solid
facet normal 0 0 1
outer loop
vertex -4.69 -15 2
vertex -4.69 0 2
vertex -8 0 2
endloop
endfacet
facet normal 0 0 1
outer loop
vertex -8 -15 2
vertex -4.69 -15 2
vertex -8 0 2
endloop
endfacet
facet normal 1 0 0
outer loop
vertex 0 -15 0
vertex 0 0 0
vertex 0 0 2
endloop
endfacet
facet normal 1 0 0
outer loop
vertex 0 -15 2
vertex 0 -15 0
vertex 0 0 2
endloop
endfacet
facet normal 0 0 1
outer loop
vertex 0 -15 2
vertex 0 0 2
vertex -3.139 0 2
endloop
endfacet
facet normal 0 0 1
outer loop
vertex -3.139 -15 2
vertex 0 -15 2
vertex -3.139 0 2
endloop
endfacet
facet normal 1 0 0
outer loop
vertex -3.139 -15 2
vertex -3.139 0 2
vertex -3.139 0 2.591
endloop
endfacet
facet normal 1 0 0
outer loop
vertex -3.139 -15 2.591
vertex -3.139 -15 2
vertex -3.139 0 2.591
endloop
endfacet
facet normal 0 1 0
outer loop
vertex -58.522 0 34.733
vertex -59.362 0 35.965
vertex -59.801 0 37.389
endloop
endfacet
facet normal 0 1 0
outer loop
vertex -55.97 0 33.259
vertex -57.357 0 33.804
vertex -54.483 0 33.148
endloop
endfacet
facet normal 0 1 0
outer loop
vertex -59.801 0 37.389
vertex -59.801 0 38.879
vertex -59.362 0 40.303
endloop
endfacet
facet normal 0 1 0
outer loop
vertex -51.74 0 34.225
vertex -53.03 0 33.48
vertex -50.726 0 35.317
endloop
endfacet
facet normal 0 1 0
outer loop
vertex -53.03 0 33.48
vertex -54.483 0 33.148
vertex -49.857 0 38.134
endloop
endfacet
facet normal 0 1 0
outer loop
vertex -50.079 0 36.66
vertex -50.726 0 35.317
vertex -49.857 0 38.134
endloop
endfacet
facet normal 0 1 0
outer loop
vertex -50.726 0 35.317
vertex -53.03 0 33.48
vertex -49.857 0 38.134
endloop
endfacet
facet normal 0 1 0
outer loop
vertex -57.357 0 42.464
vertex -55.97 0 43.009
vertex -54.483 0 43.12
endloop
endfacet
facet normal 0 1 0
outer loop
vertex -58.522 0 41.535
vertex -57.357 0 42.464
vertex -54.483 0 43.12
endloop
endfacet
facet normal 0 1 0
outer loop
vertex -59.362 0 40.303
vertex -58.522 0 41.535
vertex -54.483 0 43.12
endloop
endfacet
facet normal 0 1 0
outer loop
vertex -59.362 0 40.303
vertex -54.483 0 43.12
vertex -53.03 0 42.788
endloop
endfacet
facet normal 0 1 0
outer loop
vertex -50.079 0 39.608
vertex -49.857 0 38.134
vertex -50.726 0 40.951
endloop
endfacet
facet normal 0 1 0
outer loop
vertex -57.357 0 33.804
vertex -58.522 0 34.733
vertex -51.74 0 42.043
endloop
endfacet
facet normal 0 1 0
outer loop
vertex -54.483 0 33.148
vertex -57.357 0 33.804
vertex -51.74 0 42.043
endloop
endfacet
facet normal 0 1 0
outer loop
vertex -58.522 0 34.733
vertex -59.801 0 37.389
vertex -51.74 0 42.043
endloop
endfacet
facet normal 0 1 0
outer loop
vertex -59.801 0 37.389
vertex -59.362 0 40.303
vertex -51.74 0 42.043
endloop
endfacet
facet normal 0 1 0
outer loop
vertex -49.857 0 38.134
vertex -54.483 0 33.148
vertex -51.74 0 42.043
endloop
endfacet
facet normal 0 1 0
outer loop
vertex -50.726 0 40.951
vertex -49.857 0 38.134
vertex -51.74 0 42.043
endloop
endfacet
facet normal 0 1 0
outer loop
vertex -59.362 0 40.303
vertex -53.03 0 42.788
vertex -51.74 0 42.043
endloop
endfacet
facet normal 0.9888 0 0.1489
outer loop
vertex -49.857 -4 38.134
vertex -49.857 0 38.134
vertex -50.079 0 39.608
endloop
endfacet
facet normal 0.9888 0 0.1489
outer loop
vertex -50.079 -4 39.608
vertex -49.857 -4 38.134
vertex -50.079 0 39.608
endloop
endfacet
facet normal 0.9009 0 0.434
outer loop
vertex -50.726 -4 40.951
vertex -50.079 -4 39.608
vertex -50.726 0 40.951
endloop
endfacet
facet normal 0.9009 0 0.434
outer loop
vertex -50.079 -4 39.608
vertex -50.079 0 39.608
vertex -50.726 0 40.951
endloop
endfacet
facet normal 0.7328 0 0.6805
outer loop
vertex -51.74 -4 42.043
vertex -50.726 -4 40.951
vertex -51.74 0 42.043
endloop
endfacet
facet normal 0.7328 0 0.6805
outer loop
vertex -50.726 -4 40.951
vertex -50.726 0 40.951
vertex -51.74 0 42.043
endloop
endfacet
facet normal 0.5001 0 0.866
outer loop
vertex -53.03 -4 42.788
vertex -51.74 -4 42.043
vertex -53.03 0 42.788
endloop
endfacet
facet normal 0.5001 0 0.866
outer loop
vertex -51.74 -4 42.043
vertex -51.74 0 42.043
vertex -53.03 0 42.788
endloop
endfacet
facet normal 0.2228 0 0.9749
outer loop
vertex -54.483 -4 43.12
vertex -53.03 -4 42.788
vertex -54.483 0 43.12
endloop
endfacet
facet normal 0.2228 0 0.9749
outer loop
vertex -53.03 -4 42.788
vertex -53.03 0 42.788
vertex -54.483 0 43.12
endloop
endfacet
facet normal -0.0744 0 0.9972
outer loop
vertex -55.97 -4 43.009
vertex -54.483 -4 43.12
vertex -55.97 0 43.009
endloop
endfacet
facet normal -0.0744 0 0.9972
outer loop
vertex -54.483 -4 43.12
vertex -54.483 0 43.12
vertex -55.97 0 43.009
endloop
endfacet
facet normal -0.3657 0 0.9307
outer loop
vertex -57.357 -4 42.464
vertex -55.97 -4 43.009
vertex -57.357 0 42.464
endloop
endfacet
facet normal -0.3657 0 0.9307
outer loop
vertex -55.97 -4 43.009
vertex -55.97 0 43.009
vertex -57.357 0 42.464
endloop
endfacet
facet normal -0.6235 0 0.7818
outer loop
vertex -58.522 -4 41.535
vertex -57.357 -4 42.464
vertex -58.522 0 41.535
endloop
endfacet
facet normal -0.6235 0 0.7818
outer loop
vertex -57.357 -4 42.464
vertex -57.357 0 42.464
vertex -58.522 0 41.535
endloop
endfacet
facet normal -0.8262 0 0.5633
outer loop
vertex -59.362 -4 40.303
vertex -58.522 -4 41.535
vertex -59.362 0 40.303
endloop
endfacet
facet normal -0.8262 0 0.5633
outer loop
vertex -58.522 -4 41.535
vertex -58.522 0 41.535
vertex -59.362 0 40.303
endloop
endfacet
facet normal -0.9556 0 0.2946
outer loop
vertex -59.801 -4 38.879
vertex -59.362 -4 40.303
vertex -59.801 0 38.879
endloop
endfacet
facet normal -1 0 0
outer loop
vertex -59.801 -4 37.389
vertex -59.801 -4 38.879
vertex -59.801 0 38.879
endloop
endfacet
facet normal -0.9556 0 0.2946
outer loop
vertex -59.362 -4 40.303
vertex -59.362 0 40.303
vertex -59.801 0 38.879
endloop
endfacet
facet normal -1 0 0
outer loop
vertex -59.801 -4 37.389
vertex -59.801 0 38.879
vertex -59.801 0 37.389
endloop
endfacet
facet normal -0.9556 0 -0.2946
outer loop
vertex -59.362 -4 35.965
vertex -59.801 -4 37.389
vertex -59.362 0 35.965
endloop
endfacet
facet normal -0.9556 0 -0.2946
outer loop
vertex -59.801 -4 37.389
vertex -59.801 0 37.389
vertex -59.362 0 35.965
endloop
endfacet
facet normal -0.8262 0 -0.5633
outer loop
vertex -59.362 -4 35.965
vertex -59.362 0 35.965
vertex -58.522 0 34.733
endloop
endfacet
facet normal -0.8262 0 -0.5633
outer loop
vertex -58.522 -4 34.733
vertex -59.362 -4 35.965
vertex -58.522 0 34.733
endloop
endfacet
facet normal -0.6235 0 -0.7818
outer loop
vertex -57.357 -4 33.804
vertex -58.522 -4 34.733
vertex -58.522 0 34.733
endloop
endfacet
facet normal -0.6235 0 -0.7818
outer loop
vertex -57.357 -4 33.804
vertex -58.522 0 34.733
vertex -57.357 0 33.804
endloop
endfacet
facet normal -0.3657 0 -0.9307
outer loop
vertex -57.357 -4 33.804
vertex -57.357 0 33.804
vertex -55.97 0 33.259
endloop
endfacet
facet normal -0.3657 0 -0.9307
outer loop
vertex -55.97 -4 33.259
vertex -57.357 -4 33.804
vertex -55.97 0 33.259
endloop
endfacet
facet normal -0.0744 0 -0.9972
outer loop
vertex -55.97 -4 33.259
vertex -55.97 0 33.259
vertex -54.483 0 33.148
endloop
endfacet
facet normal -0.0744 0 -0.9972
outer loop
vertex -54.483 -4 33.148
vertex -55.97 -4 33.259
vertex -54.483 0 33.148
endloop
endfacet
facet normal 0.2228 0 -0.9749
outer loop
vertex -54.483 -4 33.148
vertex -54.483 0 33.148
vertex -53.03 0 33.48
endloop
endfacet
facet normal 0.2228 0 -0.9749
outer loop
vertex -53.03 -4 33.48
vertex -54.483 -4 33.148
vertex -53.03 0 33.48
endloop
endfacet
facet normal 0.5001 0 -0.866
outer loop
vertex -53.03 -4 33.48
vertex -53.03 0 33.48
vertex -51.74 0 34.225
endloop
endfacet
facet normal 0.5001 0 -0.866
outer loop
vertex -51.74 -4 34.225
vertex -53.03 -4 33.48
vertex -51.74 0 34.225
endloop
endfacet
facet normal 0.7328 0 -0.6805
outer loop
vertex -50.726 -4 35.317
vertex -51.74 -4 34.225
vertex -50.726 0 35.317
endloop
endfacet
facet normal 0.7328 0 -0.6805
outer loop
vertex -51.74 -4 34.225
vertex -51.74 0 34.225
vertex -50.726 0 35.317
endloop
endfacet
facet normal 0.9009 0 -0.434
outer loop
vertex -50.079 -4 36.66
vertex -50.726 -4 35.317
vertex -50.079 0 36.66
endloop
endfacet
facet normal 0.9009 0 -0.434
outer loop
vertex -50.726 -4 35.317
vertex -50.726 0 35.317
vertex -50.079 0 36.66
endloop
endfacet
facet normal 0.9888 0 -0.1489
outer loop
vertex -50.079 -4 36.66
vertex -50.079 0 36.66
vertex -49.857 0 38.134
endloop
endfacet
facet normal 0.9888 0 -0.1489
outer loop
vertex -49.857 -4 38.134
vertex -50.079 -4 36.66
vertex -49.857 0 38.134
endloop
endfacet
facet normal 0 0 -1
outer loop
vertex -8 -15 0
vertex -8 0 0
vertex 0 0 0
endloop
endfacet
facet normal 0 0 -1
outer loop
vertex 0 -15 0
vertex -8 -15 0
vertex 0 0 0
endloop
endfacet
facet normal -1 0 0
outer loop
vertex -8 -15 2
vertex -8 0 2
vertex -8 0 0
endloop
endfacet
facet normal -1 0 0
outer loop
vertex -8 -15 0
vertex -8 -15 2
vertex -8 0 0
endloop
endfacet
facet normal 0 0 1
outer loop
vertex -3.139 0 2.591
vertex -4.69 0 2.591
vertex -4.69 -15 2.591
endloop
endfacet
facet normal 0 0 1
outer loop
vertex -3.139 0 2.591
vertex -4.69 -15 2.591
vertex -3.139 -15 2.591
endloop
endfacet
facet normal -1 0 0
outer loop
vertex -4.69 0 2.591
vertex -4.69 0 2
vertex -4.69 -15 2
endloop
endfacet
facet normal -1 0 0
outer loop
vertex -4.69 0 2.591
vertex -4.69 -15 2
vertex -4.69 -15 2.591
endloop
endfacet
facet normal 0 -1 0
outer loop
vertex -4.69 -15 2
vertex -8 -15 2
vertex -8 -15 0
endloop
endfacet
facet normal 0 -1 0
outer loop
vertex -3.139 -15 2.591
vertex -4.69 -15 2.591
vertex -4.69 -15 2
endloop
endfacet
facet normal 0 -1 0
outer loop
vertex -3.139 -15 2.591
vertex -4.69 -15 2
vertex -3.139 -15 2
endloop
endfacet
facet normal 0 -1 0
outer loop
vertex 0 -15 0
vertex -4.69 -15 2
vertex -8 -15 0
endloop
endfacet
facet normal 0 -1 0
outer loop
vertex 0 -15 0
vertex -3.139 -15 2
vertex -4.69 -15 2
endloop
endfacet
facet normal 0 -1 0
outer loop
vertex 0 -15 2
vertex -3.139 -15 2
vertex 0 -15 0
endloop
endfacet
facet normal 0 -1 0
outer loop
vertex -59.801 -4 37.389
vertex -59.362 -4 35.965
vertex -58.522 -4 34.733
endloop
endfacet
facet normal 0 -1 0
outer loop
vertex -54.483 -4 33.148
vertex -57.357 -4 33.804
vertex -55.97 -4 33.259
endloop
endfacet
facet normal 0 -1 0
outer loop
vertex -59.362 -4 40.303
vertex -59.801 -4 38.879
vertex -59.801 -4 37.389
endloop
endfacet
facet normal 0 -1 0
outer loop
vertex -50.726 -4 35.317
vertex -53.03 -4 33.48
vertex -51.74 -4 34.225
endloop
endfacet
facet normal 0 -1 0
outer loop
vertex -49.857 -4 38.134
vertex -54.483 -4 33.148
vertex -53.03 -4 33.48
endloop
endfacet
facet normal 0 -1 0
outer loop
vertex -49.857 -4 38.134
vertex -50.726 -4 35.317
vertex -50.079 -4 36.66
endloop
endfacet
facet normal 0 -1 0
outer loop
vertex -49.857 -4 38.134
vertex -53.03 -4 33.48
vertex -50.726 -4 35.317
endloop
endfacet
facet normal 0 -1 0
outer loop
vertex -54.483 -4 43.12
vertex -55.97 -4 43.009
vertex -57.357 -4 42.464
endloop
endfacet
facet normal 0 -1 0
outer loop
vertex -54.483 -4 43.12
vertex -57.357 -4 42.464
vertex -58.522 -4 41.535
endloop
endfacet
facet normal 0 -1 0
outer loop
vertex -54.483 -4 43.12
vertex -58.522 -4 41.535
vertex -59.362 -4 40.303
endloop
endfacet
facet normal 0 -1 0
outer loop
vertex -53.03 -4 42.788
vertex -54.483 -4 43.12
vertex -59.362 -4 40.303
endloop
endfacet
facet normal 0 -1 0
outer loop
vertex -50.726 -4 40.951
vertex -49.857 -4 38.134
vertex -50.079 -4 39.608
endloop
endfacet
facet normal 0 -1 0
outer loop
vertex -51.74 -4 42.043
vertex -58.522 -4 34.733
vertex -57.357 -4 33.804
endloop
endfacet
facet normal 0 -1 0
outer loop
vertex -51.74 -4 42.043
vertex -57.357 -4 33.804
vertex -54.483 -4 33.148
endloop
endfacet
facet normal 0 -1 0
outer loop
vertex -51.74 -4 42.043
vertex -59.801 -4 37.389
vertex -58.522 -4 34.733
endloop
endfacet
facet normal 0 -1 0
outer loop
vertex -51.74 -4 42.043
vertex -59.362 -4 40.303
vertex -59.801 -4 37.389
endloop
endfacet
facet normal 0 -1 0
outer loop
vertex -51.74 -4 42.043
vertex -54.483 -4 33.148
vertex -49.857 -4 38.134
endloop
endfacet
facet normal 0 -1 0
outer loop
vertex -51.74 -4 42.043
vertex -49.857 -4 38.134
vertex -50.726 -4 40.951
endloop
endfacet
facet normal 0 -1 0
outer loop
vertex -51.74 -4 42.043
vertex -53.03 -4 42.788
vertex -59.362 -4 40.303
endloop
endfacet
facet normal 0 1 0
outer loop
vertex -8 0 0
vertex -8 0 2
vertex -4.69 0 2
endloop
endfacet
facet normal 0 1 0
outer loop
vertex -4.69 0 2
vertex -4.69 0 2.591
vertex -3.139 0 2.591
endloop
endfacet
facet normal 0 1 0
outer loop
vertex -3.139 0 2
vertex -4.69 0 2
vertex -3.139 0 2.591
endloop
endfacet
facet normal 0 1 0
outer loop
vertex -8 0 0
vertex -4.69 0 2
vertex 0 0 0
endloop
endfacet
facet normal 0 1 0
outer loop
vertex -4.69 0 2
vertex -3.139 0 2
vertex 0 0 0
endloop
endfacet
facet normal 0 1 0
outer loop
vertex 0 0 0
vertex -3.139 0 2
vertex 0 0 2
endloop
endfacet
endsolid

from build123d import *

# Parameters (mm, degrees)
F0_W     = 1.551184
F0_H     = 0.590979
F1_DEPTH = 15
F2_R     = 5
F3_DEPTH = 4


with BuildPart() as f1:
    # F0 (on Front) → F1 (new body)
    with BuildSketch(Plane.XZ):
        Polygon((-8, 0), (0, 0), (0, 2), (-3.138556, 2), (-4.68974, 2), (-8, 2), align=None)
        with Locations((-3.914148, 2.295489)):
            Rectangle(F0_W, F0_H)
    extrude(amount=F1_DEPTH)


with BuildPart() as f3:
    # F2 (on Front) → F3 (new body)
    with BuildSketch(Plane.XZ):
        with Locations((-54.857038, 38.13396)):
            Circle(F2_R)
    extrude(amount=F3_DEPTH)


solid = Compound([f1.part, f3.part])
